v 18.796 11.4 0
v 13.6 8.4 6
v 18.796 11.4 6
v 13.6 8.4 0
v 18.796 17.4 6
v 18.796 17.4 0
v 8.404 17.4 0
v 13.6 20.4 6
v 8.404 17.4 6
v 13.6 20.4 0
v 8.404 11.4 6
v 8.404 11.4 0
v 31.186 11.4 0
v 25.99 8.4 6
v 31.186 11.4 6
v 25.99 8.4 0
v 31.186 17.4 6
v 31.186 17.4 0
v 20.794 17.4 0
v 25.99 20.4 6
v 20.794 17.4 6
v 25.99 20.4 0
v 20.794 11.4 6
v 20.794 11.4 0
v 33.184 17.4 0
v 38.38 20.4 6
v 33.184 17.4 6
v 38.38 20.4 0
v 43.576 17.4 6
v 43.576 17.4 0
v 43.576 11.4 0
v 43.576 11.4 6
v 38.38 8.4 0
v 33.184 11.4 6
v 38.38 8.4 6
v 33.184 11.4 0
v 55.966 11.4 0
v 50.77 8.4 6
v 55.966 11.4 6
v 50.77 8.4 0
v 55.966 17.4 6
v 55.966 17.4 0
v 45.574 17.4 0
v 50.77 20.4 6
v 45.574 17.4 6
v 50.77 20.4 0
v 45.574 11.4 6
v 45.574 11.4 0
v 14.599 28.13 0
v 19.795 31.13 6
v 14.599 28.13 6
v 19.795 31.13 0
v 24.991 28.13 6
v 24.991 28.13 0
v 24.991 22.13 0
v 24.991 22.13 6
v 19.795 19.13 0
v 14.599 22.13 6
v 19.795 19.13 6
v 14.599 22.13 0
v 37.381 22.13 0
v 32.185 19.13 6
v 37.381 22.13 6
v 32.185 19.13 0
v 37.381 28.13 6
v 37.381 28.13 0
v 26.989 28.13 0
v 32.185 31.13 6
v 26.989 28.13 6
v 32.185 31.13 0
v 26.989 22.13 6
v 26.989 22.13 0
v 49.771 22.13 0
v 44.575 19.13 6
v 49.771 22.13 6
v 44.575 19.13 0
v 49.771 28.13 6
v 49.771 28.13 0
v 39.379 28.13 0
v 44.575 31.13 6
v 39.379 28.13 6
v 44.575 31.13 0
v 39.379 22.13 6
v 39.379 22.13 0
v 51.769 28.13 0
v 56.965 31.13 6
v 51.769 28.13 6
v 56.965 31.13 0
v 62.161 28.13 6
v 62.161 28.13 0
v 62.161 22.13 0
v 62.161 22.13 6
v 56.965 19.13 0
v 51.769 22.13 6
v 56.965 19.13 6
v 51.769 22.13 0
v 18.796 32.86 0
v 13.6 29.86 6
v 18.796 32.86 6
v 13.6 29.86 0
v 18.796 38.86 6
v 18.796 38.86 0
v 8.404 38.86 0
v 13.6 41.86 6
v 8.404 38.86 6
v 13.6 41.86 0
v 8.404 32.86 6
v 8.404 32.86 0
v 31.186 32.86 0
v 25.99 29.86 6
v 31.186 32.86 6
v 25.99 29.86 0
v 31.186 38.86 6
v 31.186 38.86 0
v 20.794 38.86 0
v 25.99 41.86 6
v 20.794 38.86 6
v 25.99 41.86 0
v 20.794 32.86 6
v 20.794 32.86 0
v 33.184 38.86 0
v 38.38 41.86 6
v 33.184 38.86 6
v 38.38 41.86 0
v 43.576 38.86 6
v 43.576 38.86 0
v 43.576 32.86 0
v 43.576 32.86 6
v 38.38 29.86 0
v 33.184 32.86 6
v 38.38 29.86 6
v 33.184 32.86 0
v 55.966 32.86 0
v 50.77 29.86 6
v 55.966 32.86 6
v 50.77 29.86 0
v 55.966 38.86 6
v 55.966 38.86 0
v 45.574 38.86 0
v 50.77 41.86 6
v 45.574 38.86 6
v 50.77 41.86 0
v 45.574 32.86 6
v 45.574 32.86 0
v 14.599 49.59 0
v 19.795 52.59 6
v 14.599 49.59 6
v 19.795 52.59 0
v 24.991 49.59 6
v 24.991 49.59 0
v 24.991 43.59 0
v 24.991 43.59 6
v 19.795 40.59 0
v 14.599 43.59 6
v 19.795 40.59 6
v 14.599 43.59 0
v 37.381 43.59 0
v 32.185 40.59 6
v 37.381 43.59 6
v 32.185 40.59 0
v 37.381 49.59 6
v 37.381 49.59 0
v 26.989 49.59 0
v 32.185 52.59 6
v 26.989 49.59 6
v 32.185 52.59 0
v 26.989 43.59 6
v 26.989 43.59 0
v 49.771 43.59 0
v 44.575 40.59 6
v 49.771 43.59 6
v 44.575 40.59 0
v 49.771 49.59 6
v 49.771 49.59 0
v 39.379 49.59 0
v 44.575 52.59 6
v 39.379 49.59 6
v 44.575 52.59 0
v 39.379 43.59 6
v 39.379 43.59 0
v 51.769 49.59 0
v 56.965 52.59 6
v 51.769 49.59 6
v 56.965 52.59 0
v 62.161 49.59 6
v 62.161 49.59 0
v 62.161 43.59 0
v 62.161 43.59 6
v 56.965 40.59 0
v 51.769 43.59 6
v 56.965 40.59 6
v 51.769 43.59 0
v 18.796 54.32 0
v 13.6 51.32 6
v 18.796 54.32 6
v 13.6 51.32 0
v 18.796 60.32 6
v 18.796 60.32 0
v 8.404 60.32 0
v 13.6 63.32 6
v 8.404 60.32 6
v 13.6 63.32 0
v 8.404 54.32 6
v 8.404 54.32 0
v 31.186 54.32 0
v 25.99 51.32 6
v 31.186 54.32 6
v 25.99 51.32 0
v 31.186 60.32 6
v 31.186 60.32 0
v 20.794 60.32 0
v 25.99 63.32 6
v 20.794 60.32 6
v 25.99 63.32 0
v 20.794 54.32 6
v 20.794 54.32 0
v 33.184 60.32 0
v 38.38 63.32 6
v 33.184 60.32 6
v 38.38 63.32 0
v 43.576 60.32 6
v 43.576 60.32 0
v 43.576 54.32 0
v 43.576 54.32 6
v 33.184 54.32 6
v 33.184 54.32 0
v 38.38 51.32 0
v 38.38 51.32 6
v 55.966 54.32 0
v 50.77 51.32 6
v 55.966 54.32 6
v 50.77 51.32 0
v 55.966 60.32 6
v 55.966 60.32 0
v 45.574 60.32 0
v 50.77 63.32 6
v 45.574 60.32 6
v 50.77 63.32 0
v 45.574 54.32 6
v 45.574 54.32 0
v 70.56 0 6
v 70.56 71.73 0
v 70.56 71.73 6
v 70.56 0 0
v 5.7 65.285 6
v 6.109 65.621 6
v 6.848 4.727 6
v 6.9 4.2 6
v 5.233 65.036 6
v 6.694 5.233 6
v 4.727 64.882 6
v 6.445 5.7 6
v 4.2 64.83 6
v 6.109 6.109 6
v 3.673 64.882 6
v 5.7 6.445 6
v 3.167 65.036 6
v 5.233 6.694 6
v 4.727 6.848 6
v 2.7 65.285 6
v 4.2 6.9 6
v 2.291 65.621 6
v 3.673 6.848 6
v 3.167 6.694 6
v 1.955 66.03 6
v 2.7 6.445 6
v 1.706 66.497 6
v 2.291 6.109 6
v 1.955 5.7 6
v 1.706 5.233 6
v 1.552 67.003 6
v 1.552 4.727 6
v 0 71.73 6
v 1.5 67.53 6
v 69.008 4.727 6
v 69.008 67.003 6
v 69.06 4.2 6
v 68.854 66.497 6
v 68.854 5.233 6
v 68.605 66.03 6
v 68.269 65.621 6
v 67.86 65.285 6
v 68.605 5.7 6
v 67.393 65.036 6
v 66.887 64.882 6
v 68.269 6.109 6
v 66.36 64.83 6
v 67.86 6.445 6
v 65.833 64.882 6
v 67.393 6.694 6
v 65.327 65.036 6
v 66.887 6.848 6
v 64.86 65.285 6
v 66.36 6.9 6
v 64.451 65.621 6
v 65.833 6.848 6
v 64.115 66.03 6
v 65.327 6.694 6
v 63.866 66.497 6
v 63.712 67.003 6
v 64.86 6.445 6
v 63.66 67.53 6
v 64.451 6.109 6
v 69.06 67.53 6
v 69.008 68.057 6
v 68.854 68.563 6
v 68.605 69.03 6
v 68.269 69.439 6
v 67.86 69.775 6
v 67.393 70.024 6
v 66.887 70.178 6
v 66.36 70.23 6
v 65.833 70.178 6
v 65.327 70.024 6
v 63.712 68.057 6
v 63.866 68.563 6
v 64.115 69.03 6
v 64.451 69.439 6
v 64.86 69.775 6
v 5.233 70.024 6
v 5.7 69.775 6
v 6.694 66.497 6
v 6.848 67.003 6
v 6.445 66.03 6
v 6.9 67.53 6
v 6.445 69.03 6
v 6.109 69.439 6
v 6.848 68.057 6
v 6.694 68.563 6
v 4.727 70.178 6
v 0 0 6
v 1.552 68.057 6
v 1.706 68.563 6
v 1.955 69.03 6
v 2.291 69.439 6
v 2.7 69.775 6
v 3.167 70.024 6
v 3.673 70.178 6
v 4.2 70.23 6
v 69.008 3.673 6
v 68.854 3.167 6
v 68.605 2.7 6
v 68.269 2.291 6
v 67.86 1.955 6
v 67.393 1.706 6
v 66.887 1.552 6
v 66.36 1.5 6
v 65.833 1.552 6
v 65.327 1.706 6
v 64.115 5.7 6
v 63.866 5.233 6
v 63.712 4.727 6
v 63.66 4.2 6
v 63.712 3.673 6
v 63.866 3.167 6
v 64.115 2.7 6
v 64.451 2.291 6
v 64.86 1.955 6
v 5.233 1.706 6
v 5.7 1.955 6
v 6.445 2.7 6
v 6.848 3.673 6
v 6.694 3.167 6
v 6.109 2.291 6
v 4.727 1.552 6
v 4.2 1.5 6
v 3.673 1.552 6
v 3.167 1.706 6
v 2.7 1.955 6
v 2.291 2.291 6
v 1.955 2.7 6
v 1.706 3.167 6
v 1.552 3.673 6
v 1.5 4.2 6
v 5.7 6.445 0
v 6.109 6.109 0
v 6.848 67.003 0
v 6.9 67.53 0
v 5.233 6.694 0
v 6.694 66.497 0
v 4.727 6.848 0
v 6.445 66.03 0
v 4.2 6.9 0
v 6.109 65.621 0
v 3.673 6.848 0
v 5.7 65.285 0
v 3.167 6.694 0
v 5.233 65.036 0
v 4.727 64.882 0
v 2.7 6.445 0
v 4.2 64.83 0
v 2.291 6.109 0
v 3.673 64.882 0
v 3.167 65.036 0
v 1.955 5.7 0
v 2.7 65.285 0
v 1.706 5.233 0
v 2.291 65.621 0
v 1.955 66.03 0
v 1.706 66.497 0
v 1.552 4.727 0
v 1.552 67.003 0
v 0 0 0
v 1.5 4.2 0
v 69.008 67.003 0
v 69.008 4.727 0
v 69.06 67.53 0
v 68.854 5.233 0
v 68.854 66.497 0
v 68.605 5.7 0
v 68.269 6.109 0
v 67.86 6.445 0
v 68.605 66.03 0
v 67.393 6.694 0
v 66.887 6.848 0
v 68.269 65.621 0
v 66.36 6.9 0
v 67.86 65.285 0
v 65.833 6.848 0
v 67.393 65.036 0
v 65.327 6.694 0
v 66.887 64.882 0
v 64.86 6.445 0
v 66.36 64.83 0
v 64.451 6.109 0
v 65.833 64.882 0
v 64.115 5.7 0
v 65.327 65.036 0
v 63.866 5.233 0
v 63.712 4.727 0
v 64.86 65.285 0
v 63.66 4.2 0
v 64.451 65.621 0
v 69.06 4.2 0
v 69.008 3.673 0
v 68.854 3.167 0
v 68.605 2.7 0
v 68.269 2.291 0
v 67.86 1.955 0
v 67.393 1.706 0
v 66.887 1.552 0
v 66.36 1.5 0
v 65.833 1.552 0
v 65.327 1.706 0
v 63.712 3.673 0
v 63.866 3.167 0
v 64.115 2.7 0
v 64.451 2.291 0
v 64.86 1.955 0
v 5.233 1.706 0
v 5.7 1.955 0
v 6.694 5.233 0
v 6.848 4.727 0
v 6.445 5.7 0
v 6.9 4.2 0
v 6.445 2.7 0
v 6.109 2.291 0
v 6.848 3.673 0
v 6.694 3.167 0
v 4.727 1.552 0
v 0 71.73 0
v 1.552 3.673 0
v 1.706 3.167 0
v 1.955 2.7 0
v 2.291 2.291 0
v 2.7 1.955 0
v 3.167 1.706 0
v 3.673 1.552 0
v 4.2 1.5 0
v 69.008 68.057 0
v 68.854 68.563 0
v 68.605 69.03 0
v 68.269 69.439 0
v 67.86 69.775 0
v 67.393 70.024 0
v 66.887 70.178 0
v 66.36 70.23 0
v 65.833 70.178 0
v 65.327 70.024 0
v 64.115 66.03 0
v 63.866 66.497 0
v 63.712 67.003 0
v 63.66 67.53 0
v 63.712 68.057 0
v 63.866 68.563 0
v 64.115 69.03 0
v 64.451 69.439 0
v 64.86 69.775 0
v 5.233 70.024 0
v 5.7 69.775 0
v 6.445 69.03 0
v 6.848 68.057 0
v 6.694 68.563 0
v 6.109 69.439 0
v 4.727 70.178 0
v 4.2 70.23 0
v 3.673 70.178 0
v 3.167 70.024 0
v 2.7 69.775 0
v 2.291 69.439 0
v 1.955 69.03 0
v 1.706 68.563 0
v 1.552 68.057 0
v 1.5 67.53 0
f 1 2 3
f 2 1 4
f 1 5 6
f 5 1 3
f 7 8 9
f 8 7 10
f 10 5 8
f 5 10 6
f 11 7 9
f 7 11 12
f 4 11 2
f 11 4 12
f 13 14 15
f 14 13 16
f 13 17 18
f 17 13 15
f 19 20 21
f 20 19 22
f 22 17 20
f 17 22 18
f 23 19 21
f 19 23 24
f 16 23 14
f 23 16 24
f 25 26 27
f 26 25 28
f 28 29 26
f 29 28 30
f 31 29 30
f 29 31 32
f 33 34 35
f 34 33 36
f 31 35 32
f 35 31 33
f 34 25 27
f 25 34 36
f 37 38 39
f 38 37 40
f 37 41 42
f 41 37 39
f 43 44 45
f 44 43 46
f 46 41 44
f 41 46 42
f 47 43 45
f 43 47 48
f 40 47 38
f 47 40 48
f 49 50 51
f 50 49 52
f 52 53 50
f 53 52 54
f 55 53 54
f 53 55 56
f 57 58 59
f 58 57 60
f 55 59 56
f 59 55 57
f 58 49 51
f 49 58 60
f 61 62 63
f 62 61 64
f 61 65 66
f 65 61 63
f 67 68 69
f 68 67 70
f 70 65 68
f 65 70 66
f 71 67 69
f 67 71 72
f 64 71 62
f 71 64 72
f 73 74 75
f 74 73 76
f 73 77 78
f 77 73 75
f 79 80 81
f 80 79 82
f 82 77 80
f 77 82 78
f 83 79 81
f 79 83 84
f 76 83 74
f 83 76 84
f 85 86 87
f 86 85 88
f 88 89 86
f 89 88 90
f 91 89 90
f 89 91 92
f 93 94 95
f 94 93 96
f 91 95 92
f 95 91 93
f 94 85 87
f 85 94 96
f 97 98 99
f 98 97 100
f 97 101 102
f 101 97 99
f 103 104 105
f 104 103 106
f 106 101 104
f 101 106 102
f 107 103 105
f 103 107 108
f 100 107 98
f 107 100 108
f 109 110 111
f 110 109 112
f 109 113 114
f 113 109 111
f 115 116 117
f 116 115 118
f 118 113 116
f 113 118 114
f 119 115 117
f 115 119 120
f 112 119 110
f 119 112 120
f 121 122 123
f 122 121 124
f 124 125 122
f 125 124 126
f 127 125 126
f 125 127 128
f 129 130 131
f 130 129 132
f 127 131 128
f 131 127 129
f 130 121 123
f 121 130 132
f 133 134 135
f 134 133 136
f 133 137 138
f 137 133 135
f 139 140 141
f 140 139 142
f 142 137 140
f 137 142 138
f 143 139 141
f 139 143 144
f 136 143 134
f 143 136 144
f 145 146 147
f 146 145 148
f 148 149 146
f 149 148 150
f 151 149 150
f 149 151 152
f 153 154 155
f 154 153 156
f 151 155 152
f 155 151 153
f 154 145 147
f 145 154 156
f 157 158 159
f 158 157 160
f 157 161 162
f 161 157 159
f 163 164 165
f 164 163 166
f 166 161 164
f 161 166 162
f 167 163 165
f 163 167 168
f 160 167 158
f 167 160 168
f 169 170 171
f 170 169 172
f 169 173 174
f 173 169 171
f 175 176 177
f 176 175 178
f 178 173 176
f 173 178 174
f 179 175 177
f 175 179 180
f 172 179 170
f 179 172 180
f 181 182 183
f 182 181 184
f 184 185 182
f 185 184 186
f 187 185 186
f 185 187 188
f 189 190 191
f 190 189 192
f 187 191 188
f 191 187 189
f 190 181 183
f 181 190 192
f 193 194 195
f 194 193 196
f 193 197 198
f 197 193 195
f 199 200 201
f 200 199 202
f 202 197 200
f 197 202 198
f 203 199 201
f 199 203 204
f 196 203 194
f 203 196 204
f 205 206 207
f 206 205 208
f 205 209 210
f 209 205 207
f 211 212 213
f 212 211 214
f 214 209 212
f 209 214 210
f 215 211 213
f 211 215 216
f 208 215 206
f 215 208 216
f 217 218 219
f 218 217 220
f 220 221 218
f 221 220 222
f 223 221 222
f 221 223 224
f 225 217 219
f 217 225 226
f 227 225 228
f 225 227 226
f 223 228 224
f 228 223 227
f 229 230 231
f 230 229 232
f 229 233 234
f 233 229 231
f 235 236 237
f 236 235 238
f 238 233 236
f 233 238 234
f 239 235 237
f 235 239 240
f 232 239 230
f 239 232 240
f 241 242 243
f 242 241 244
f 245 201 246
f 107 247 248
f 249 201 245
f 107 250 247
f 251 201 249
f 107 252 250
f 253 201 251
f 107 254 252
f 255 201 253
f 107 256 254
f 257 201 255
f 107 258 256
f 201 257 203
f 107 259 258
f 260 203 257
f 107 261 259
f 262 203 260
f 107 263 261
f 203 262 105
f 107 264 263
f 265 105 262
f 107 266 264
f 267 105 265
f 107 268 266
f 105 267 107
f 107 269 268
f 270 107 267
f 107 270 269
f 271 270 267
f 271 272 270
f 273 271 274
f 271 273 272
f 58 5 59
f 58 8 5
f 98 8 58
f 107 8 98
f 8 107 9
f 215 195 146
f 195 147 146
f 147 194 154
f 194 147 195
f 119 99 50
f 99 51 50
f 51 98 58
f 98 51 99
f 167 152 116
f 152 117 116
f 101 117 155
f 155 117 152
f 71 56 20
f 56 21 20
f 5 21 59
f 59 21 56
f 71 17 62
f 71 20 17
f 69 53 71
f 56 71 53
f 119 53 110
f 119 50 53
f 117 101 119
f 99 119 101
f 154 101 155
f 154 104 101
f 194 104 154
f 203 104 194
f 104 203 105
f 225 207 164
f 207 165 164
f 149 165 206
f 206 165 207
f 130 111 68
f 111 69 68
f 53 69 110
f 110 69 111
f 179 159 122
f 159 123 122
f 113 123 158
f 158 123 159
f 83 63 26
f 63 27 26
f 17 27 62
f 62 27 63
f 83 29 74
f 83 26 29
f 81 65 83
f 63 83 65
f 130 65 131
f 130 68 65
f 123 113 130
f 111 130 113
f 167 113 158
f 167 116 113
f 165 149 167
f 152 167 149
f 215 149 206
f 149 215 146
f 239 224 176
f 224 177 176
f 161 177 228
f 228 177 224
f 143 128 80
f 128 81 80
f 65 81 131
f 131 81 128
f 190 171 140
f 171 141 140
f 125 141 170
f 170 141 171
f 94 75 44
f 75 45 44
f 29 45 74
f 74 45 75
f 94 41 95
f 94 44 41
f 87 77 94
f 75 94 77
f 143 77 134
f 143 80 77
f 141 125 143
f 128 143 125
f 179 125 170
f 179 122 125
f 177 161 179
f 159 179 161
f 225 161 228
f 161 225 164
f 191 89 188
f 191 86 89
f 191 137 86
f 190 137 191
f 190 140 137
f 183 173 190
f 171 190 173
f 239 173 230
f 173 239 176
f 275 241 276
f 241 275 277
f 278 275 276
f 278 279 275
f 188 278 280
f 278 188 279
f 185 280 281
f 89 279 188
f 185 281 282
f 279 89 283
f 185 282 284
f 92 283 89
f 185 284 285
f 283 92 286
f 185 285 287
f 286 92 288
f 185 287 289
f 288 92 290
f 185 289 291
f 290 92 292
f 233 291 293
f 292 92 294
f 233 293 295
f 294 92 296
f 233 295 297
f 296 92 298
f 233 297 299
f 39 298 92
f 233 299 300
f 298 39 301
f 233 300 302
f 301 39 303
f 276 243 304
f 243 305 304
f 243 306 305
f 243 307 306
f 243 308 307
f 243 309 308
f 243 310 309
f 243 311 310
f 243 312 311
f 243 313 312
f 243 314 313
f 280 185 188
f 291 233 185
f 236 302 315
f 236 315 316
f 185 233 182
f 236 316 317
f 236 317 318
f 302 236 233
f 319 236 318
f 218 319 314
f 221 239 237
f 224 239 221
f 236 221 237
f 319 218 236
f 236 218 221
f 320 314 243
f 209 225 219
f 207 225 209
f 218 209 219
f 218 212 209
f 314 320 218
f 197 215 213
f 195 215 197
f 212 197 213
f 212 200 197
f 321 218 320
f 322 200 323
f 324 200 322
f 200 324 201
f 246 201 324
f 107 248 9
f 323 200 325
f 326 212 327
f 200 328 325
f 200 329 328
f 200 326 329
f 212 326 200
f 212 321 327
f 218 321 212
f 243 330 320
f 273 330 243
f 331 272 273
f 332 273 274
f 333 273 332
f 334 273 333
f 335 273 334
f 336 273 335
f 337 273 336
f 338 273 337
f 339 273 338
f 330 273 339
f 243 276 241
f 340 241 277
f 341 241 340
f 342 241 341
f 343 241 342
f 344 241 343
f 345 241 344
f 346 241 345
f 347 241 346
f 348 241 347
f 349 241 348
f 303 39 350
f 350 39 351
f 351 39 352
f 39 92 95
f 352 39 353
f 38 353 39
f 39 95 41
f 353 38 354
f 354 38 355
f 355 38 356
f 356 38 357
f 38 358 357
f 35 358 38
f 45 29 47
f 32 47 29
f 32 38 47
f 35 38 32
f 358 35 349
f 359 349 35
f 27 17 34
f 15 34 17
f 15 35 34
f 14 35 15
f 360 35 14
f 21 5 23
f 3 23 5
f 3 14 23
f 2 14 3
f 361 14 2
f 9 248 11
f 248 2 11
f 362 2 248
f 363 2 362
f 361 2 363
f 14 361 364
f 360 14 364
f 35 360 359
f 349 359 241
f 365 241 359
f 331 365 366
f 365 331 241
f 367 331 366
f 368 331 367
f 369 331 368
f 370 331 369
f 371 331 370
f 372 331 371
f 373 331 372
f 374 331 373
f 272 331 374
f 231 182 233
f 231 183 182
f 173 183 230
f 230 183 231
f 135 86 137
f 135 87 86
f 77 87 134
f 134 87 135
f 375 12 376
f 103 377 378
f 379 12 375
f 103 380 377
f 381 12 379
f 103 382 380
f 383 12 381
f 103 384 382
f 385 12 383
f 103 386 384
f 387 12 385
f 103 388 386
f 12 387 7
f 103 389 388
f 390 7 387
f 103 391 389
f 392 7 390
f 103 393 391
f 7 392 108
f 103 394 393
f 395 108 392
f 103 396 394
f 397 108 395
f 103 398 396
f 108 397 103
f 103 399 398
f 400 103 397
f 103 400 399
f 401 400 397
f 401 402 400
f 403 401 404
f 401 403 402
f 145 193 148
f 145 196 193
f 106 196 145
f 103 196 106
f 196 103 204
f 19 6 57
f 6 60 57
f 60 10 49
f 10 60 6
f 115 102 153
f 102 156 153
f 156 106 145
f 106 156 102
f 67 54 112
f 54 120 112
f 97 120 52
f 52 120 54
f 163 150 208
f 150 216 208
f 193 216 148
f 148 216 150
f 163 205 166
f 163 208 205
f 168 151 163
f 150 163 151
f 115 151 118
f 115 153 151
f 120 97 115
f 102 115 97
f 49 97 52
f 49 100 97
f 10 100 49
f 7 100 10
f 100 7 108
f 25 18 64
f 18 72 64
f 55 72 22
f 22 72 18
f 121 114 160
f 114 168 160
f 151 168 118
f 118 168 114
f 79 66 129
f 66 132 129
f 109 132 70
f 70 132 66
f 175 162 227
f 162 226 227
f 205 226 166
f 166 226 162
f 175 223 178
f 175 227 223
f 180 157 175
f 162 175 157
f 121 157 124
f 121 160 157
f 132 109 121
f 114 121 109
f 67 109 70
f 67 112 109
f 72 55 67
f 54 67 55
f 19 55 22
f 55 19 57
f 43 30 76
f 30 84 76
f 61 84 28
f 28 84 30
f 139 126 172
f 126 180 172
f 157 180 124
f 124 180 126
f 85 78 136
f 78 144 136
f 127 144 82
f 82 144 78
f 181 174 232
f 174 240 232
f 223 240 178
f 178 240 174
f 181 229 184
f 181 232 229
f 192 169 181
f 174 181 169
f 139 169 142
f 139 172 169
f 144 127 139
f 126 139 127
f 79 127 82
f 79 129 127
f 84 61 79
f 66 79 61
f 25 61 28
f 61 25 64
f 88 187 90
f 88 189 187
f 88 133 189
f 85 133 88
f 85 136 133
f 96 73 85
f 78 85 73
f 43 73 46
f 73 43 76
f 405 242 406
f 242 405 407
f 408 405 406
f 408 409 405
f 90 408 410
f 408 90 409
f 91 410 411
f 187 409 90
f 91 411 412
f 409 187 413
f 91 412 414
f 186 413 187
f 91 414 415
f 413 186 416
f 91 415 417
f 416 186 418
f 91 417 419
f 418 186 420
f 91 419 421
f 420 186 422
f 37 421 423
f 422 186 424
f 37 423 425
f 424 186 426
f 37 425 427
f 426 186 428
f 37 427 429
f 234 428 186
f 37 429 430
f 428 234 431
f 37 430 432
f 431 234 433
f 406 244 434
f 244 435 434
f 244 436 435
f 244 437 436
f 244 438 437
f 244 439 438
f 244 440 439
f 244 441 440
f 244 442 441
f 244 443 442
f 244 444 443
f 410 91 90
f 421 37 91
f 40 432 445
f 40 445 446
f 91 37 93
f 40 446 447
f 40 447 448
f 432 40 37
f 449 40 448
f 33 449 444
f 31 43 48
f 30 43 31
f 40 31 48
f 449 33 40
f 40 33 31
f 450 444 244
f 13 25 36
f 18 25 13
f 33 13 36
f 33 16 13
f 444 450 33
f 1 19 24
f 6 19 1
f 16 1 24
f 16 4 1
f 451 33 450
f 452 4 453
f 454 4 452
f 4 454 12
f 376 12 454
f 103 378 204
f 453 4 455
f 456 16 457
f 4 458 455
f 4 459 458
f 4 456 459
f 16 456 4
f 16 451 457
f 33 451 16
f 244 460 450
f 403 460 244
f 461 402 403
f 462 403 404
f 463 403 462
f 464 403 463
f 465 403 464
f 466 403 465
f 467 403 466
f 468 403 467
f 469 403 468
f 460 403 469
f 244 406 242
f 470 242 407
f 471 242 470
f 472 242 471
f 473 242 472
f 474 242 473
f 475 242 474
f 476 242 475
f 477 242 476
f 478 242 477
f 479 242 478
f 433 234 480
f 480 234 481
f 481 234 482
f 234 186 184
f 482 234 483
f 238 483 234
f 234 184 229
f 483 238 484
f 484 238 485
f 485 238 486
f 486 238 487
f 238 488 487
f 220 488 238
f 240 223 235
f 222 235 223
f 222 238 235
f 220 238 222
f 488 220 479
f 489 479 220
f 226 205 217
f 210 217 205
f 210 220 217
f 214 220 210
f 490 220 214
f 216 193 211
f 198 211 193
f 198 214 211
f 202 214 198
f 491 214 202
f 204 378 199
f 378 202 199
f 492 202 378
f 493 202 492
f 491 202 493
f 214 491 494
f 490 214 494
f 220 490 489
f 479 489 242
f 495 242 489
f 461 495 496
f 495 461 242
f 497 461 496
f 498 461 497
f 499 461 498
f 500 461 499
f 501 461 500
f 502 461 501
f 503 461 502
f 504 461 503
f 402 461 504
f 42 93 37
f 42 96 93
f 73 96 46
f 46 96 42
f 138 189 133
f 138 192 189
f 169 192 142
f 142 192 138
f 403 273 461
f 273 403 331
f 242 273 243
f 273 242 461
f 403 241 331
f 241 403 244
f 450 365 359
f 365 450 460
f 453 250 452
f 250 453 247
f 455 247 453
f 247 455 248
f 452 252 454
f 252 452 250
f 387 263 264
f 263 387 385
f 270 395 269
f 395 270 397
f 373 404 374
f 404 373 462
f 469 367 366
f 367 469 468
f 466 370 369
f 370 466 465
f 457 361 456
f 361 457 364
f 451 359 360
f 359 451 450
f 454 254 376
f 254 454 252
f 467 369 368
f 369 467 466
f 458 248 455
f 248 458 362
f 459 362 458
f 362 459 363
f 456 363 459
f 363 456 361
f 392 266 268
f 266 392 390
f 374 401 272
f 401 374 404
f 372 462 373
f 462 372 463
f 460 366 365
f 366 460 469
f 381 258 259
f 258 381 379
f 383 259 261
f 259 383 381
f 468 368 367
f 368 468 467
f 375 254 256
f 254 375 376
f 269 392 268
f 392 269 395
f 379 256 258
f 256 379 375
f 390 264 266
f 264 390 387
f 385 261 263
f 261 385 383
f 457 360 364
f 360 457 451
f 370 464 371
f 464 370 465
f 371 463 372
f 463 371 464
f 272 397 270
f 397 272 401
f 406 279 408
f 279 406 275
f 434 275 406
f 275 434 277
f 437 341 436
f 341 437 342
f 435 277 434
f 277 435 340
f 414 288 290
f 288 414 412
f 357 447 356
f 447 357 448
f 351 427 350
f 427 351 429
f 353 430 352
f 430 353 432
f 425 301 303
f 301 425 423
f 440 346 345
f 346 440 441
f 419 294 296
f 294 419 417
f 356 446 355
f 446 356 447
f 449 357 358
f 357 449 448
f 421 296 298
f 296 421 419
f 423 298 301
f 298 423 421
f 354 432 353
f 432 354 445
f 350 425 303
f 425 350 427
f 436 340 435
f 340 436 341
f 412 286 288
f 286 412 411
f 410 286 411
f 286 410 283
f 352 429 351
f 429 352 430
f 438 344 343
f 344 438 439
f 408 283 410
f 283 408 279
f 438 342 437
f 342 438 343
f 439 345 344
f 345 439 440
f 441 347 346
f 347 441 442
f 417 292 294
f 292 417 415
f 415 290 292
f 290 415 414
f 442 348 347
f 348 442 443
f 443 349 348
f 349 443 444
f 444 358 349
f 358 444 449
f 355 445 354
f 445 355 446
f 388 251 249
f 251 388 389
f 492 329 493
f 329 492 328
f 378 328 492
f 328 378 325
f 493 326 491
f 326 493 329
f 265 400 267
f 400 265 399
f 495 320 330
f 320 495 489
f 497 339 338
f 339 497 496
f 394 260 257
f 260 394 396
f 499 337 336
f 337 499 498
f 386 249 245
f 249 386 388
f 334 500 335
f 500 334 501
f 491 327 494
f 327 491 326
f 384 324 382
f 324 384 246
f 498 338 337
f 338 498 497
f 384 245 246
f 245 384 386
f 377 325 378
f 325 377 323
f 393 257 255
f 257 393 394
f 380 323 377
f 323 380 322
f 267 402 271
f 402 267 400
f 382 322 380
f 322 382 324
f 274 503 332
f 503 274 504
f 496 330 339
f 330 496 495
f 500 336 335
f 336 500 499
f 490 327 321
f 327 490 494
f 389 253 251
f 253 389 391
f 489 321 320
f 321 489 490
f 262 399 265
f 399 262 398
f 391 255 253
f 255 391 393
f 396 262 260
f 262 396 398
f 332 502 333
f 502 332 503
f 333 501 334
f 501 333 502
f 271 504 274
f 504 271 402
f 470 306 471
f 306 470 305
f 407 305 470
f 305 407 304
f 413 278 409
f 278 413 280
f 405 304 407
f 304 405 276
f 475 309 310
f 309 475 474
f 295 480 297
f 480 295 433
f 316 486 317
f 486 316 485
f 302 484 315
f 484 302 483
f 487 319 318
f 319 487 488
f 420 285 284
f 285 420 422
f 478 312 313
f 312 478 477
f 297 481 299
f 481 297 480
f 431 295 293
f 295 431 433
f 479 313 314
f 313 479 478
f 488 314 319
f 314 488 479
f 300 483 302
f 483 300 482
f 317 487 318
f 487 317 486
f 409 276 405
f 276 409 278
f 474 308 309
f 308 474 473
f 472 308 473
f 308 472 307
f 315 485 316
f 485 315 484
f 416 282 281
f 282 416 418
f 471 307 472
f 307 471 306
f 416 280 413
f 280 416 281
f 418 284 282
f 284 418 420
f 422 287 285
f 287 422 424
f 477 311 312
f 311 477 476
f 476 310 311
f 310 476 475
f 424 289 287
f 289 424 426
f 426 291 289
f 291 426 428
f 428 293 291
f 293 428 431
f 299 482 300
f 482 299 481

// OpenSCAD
$fn = 32;

// ----------------------------------------------------------------------
// Honeycomb panel: 70.56 x 71.73 mm, 20 cells of 12 mm
// ----------------------------------------------------------------------

// --- parameters (mm) ---
panel_w = 70.56;          // panel width
panel_d = 71.73;          // panel depth
thick = 6;                // panel thickness
cell_r = 6;               // hex cell circumradius
pitch = 12.39;            // hex cell pitch (centre to centre)
web = 2;                  // web between the cells
columns = 4;              // columns of cells
rows = 5;                 // rows of cells
cell_count = 20;          // total cells
shift_x = 13.6;           // first cell offset in x
shift_y = 14.4;           // first cell offset in y
mount_d = 5.4;            // corner mounting holes
hole_off = 4.2;           // mounting hole offset from the corners

difference() {
  union() {
    cube([panel_w, panel_d, thick]);
  }
  /* hexagonal cells, point-up, cut right through the plate */
  for (row = [0 : rows - 1]) {
    for (col = [0 : columns - 1]) {
      translate([shift_x + col * pitch + (row % 2) * pitch / 2, shift_y + row * pitch * 0.866025, -2.5]) rotate([0, 0, 30]) cylinder(h = thick + 5, d = 2 * cell_r, $fn = 6);
    }
  }
  /* corner mounting holes, clear of the outer cell web */
  translate([4.2, 4.2, -2.5]) cylinder(h = thick + 5, d = mount_d);
  translate([66.36, 4.2, -2.5]) cylinder(h = thick + 5, d = mount_d);
  translate([4.2, 67.53, -2.5]) cylinder(h = thick + 5, d = mount_d);
  translate([66.36, 67.53, -2.5]) cylinder(h = thick + 5, d = mount_d);
}
